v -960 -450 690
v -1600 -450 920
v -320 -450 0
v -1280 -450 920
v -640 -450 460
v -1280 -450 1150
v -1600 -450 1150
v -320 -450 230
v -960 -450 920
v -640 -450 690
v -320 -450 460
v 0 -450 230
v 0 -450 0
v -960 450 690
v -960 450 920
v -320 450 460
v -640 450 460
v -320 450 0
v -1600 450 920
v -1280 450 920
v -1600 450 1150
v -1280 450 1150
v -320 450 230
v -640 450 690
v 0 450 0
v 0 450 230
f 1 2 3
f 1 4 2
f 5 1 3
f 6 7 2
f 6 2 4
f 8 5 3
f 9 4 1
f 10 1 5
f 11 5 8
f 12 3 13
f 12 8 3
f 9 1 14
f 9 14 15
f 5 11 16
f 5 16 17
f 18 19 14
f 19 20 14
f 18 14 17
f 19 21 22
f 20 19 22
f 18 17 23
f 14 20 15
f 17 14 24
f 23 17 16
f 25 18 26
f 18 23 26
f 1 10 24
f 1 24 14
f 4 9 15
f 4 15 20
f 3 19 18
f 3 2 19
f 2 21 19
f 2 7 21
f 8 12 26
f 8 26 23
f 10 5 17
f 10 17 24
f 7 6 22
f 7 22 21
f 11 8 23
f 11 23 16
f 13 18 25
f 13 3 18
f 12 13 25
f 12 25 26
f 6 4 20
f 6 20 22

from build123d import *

# Parameters (mm, degrees)
F1_DEPTH = 450


with BuildPart() as f1:
    # F0 (on Front) → F1 (new body, symmetric)
    with BuildSketch(Plane.XZ):
        Polygon((-320, 0), (0, 0), (0, 230), (-320, 230), (-320, 460), (-640, 460), (-640, 690), (-960, 690), (-960, 920), (-1280, 920), (-1280, 1150), (-1600, 1150), (-1600, 920), align=None)
    extrude(amount=F1_DEPTH, both=True)


solid = f1.part
